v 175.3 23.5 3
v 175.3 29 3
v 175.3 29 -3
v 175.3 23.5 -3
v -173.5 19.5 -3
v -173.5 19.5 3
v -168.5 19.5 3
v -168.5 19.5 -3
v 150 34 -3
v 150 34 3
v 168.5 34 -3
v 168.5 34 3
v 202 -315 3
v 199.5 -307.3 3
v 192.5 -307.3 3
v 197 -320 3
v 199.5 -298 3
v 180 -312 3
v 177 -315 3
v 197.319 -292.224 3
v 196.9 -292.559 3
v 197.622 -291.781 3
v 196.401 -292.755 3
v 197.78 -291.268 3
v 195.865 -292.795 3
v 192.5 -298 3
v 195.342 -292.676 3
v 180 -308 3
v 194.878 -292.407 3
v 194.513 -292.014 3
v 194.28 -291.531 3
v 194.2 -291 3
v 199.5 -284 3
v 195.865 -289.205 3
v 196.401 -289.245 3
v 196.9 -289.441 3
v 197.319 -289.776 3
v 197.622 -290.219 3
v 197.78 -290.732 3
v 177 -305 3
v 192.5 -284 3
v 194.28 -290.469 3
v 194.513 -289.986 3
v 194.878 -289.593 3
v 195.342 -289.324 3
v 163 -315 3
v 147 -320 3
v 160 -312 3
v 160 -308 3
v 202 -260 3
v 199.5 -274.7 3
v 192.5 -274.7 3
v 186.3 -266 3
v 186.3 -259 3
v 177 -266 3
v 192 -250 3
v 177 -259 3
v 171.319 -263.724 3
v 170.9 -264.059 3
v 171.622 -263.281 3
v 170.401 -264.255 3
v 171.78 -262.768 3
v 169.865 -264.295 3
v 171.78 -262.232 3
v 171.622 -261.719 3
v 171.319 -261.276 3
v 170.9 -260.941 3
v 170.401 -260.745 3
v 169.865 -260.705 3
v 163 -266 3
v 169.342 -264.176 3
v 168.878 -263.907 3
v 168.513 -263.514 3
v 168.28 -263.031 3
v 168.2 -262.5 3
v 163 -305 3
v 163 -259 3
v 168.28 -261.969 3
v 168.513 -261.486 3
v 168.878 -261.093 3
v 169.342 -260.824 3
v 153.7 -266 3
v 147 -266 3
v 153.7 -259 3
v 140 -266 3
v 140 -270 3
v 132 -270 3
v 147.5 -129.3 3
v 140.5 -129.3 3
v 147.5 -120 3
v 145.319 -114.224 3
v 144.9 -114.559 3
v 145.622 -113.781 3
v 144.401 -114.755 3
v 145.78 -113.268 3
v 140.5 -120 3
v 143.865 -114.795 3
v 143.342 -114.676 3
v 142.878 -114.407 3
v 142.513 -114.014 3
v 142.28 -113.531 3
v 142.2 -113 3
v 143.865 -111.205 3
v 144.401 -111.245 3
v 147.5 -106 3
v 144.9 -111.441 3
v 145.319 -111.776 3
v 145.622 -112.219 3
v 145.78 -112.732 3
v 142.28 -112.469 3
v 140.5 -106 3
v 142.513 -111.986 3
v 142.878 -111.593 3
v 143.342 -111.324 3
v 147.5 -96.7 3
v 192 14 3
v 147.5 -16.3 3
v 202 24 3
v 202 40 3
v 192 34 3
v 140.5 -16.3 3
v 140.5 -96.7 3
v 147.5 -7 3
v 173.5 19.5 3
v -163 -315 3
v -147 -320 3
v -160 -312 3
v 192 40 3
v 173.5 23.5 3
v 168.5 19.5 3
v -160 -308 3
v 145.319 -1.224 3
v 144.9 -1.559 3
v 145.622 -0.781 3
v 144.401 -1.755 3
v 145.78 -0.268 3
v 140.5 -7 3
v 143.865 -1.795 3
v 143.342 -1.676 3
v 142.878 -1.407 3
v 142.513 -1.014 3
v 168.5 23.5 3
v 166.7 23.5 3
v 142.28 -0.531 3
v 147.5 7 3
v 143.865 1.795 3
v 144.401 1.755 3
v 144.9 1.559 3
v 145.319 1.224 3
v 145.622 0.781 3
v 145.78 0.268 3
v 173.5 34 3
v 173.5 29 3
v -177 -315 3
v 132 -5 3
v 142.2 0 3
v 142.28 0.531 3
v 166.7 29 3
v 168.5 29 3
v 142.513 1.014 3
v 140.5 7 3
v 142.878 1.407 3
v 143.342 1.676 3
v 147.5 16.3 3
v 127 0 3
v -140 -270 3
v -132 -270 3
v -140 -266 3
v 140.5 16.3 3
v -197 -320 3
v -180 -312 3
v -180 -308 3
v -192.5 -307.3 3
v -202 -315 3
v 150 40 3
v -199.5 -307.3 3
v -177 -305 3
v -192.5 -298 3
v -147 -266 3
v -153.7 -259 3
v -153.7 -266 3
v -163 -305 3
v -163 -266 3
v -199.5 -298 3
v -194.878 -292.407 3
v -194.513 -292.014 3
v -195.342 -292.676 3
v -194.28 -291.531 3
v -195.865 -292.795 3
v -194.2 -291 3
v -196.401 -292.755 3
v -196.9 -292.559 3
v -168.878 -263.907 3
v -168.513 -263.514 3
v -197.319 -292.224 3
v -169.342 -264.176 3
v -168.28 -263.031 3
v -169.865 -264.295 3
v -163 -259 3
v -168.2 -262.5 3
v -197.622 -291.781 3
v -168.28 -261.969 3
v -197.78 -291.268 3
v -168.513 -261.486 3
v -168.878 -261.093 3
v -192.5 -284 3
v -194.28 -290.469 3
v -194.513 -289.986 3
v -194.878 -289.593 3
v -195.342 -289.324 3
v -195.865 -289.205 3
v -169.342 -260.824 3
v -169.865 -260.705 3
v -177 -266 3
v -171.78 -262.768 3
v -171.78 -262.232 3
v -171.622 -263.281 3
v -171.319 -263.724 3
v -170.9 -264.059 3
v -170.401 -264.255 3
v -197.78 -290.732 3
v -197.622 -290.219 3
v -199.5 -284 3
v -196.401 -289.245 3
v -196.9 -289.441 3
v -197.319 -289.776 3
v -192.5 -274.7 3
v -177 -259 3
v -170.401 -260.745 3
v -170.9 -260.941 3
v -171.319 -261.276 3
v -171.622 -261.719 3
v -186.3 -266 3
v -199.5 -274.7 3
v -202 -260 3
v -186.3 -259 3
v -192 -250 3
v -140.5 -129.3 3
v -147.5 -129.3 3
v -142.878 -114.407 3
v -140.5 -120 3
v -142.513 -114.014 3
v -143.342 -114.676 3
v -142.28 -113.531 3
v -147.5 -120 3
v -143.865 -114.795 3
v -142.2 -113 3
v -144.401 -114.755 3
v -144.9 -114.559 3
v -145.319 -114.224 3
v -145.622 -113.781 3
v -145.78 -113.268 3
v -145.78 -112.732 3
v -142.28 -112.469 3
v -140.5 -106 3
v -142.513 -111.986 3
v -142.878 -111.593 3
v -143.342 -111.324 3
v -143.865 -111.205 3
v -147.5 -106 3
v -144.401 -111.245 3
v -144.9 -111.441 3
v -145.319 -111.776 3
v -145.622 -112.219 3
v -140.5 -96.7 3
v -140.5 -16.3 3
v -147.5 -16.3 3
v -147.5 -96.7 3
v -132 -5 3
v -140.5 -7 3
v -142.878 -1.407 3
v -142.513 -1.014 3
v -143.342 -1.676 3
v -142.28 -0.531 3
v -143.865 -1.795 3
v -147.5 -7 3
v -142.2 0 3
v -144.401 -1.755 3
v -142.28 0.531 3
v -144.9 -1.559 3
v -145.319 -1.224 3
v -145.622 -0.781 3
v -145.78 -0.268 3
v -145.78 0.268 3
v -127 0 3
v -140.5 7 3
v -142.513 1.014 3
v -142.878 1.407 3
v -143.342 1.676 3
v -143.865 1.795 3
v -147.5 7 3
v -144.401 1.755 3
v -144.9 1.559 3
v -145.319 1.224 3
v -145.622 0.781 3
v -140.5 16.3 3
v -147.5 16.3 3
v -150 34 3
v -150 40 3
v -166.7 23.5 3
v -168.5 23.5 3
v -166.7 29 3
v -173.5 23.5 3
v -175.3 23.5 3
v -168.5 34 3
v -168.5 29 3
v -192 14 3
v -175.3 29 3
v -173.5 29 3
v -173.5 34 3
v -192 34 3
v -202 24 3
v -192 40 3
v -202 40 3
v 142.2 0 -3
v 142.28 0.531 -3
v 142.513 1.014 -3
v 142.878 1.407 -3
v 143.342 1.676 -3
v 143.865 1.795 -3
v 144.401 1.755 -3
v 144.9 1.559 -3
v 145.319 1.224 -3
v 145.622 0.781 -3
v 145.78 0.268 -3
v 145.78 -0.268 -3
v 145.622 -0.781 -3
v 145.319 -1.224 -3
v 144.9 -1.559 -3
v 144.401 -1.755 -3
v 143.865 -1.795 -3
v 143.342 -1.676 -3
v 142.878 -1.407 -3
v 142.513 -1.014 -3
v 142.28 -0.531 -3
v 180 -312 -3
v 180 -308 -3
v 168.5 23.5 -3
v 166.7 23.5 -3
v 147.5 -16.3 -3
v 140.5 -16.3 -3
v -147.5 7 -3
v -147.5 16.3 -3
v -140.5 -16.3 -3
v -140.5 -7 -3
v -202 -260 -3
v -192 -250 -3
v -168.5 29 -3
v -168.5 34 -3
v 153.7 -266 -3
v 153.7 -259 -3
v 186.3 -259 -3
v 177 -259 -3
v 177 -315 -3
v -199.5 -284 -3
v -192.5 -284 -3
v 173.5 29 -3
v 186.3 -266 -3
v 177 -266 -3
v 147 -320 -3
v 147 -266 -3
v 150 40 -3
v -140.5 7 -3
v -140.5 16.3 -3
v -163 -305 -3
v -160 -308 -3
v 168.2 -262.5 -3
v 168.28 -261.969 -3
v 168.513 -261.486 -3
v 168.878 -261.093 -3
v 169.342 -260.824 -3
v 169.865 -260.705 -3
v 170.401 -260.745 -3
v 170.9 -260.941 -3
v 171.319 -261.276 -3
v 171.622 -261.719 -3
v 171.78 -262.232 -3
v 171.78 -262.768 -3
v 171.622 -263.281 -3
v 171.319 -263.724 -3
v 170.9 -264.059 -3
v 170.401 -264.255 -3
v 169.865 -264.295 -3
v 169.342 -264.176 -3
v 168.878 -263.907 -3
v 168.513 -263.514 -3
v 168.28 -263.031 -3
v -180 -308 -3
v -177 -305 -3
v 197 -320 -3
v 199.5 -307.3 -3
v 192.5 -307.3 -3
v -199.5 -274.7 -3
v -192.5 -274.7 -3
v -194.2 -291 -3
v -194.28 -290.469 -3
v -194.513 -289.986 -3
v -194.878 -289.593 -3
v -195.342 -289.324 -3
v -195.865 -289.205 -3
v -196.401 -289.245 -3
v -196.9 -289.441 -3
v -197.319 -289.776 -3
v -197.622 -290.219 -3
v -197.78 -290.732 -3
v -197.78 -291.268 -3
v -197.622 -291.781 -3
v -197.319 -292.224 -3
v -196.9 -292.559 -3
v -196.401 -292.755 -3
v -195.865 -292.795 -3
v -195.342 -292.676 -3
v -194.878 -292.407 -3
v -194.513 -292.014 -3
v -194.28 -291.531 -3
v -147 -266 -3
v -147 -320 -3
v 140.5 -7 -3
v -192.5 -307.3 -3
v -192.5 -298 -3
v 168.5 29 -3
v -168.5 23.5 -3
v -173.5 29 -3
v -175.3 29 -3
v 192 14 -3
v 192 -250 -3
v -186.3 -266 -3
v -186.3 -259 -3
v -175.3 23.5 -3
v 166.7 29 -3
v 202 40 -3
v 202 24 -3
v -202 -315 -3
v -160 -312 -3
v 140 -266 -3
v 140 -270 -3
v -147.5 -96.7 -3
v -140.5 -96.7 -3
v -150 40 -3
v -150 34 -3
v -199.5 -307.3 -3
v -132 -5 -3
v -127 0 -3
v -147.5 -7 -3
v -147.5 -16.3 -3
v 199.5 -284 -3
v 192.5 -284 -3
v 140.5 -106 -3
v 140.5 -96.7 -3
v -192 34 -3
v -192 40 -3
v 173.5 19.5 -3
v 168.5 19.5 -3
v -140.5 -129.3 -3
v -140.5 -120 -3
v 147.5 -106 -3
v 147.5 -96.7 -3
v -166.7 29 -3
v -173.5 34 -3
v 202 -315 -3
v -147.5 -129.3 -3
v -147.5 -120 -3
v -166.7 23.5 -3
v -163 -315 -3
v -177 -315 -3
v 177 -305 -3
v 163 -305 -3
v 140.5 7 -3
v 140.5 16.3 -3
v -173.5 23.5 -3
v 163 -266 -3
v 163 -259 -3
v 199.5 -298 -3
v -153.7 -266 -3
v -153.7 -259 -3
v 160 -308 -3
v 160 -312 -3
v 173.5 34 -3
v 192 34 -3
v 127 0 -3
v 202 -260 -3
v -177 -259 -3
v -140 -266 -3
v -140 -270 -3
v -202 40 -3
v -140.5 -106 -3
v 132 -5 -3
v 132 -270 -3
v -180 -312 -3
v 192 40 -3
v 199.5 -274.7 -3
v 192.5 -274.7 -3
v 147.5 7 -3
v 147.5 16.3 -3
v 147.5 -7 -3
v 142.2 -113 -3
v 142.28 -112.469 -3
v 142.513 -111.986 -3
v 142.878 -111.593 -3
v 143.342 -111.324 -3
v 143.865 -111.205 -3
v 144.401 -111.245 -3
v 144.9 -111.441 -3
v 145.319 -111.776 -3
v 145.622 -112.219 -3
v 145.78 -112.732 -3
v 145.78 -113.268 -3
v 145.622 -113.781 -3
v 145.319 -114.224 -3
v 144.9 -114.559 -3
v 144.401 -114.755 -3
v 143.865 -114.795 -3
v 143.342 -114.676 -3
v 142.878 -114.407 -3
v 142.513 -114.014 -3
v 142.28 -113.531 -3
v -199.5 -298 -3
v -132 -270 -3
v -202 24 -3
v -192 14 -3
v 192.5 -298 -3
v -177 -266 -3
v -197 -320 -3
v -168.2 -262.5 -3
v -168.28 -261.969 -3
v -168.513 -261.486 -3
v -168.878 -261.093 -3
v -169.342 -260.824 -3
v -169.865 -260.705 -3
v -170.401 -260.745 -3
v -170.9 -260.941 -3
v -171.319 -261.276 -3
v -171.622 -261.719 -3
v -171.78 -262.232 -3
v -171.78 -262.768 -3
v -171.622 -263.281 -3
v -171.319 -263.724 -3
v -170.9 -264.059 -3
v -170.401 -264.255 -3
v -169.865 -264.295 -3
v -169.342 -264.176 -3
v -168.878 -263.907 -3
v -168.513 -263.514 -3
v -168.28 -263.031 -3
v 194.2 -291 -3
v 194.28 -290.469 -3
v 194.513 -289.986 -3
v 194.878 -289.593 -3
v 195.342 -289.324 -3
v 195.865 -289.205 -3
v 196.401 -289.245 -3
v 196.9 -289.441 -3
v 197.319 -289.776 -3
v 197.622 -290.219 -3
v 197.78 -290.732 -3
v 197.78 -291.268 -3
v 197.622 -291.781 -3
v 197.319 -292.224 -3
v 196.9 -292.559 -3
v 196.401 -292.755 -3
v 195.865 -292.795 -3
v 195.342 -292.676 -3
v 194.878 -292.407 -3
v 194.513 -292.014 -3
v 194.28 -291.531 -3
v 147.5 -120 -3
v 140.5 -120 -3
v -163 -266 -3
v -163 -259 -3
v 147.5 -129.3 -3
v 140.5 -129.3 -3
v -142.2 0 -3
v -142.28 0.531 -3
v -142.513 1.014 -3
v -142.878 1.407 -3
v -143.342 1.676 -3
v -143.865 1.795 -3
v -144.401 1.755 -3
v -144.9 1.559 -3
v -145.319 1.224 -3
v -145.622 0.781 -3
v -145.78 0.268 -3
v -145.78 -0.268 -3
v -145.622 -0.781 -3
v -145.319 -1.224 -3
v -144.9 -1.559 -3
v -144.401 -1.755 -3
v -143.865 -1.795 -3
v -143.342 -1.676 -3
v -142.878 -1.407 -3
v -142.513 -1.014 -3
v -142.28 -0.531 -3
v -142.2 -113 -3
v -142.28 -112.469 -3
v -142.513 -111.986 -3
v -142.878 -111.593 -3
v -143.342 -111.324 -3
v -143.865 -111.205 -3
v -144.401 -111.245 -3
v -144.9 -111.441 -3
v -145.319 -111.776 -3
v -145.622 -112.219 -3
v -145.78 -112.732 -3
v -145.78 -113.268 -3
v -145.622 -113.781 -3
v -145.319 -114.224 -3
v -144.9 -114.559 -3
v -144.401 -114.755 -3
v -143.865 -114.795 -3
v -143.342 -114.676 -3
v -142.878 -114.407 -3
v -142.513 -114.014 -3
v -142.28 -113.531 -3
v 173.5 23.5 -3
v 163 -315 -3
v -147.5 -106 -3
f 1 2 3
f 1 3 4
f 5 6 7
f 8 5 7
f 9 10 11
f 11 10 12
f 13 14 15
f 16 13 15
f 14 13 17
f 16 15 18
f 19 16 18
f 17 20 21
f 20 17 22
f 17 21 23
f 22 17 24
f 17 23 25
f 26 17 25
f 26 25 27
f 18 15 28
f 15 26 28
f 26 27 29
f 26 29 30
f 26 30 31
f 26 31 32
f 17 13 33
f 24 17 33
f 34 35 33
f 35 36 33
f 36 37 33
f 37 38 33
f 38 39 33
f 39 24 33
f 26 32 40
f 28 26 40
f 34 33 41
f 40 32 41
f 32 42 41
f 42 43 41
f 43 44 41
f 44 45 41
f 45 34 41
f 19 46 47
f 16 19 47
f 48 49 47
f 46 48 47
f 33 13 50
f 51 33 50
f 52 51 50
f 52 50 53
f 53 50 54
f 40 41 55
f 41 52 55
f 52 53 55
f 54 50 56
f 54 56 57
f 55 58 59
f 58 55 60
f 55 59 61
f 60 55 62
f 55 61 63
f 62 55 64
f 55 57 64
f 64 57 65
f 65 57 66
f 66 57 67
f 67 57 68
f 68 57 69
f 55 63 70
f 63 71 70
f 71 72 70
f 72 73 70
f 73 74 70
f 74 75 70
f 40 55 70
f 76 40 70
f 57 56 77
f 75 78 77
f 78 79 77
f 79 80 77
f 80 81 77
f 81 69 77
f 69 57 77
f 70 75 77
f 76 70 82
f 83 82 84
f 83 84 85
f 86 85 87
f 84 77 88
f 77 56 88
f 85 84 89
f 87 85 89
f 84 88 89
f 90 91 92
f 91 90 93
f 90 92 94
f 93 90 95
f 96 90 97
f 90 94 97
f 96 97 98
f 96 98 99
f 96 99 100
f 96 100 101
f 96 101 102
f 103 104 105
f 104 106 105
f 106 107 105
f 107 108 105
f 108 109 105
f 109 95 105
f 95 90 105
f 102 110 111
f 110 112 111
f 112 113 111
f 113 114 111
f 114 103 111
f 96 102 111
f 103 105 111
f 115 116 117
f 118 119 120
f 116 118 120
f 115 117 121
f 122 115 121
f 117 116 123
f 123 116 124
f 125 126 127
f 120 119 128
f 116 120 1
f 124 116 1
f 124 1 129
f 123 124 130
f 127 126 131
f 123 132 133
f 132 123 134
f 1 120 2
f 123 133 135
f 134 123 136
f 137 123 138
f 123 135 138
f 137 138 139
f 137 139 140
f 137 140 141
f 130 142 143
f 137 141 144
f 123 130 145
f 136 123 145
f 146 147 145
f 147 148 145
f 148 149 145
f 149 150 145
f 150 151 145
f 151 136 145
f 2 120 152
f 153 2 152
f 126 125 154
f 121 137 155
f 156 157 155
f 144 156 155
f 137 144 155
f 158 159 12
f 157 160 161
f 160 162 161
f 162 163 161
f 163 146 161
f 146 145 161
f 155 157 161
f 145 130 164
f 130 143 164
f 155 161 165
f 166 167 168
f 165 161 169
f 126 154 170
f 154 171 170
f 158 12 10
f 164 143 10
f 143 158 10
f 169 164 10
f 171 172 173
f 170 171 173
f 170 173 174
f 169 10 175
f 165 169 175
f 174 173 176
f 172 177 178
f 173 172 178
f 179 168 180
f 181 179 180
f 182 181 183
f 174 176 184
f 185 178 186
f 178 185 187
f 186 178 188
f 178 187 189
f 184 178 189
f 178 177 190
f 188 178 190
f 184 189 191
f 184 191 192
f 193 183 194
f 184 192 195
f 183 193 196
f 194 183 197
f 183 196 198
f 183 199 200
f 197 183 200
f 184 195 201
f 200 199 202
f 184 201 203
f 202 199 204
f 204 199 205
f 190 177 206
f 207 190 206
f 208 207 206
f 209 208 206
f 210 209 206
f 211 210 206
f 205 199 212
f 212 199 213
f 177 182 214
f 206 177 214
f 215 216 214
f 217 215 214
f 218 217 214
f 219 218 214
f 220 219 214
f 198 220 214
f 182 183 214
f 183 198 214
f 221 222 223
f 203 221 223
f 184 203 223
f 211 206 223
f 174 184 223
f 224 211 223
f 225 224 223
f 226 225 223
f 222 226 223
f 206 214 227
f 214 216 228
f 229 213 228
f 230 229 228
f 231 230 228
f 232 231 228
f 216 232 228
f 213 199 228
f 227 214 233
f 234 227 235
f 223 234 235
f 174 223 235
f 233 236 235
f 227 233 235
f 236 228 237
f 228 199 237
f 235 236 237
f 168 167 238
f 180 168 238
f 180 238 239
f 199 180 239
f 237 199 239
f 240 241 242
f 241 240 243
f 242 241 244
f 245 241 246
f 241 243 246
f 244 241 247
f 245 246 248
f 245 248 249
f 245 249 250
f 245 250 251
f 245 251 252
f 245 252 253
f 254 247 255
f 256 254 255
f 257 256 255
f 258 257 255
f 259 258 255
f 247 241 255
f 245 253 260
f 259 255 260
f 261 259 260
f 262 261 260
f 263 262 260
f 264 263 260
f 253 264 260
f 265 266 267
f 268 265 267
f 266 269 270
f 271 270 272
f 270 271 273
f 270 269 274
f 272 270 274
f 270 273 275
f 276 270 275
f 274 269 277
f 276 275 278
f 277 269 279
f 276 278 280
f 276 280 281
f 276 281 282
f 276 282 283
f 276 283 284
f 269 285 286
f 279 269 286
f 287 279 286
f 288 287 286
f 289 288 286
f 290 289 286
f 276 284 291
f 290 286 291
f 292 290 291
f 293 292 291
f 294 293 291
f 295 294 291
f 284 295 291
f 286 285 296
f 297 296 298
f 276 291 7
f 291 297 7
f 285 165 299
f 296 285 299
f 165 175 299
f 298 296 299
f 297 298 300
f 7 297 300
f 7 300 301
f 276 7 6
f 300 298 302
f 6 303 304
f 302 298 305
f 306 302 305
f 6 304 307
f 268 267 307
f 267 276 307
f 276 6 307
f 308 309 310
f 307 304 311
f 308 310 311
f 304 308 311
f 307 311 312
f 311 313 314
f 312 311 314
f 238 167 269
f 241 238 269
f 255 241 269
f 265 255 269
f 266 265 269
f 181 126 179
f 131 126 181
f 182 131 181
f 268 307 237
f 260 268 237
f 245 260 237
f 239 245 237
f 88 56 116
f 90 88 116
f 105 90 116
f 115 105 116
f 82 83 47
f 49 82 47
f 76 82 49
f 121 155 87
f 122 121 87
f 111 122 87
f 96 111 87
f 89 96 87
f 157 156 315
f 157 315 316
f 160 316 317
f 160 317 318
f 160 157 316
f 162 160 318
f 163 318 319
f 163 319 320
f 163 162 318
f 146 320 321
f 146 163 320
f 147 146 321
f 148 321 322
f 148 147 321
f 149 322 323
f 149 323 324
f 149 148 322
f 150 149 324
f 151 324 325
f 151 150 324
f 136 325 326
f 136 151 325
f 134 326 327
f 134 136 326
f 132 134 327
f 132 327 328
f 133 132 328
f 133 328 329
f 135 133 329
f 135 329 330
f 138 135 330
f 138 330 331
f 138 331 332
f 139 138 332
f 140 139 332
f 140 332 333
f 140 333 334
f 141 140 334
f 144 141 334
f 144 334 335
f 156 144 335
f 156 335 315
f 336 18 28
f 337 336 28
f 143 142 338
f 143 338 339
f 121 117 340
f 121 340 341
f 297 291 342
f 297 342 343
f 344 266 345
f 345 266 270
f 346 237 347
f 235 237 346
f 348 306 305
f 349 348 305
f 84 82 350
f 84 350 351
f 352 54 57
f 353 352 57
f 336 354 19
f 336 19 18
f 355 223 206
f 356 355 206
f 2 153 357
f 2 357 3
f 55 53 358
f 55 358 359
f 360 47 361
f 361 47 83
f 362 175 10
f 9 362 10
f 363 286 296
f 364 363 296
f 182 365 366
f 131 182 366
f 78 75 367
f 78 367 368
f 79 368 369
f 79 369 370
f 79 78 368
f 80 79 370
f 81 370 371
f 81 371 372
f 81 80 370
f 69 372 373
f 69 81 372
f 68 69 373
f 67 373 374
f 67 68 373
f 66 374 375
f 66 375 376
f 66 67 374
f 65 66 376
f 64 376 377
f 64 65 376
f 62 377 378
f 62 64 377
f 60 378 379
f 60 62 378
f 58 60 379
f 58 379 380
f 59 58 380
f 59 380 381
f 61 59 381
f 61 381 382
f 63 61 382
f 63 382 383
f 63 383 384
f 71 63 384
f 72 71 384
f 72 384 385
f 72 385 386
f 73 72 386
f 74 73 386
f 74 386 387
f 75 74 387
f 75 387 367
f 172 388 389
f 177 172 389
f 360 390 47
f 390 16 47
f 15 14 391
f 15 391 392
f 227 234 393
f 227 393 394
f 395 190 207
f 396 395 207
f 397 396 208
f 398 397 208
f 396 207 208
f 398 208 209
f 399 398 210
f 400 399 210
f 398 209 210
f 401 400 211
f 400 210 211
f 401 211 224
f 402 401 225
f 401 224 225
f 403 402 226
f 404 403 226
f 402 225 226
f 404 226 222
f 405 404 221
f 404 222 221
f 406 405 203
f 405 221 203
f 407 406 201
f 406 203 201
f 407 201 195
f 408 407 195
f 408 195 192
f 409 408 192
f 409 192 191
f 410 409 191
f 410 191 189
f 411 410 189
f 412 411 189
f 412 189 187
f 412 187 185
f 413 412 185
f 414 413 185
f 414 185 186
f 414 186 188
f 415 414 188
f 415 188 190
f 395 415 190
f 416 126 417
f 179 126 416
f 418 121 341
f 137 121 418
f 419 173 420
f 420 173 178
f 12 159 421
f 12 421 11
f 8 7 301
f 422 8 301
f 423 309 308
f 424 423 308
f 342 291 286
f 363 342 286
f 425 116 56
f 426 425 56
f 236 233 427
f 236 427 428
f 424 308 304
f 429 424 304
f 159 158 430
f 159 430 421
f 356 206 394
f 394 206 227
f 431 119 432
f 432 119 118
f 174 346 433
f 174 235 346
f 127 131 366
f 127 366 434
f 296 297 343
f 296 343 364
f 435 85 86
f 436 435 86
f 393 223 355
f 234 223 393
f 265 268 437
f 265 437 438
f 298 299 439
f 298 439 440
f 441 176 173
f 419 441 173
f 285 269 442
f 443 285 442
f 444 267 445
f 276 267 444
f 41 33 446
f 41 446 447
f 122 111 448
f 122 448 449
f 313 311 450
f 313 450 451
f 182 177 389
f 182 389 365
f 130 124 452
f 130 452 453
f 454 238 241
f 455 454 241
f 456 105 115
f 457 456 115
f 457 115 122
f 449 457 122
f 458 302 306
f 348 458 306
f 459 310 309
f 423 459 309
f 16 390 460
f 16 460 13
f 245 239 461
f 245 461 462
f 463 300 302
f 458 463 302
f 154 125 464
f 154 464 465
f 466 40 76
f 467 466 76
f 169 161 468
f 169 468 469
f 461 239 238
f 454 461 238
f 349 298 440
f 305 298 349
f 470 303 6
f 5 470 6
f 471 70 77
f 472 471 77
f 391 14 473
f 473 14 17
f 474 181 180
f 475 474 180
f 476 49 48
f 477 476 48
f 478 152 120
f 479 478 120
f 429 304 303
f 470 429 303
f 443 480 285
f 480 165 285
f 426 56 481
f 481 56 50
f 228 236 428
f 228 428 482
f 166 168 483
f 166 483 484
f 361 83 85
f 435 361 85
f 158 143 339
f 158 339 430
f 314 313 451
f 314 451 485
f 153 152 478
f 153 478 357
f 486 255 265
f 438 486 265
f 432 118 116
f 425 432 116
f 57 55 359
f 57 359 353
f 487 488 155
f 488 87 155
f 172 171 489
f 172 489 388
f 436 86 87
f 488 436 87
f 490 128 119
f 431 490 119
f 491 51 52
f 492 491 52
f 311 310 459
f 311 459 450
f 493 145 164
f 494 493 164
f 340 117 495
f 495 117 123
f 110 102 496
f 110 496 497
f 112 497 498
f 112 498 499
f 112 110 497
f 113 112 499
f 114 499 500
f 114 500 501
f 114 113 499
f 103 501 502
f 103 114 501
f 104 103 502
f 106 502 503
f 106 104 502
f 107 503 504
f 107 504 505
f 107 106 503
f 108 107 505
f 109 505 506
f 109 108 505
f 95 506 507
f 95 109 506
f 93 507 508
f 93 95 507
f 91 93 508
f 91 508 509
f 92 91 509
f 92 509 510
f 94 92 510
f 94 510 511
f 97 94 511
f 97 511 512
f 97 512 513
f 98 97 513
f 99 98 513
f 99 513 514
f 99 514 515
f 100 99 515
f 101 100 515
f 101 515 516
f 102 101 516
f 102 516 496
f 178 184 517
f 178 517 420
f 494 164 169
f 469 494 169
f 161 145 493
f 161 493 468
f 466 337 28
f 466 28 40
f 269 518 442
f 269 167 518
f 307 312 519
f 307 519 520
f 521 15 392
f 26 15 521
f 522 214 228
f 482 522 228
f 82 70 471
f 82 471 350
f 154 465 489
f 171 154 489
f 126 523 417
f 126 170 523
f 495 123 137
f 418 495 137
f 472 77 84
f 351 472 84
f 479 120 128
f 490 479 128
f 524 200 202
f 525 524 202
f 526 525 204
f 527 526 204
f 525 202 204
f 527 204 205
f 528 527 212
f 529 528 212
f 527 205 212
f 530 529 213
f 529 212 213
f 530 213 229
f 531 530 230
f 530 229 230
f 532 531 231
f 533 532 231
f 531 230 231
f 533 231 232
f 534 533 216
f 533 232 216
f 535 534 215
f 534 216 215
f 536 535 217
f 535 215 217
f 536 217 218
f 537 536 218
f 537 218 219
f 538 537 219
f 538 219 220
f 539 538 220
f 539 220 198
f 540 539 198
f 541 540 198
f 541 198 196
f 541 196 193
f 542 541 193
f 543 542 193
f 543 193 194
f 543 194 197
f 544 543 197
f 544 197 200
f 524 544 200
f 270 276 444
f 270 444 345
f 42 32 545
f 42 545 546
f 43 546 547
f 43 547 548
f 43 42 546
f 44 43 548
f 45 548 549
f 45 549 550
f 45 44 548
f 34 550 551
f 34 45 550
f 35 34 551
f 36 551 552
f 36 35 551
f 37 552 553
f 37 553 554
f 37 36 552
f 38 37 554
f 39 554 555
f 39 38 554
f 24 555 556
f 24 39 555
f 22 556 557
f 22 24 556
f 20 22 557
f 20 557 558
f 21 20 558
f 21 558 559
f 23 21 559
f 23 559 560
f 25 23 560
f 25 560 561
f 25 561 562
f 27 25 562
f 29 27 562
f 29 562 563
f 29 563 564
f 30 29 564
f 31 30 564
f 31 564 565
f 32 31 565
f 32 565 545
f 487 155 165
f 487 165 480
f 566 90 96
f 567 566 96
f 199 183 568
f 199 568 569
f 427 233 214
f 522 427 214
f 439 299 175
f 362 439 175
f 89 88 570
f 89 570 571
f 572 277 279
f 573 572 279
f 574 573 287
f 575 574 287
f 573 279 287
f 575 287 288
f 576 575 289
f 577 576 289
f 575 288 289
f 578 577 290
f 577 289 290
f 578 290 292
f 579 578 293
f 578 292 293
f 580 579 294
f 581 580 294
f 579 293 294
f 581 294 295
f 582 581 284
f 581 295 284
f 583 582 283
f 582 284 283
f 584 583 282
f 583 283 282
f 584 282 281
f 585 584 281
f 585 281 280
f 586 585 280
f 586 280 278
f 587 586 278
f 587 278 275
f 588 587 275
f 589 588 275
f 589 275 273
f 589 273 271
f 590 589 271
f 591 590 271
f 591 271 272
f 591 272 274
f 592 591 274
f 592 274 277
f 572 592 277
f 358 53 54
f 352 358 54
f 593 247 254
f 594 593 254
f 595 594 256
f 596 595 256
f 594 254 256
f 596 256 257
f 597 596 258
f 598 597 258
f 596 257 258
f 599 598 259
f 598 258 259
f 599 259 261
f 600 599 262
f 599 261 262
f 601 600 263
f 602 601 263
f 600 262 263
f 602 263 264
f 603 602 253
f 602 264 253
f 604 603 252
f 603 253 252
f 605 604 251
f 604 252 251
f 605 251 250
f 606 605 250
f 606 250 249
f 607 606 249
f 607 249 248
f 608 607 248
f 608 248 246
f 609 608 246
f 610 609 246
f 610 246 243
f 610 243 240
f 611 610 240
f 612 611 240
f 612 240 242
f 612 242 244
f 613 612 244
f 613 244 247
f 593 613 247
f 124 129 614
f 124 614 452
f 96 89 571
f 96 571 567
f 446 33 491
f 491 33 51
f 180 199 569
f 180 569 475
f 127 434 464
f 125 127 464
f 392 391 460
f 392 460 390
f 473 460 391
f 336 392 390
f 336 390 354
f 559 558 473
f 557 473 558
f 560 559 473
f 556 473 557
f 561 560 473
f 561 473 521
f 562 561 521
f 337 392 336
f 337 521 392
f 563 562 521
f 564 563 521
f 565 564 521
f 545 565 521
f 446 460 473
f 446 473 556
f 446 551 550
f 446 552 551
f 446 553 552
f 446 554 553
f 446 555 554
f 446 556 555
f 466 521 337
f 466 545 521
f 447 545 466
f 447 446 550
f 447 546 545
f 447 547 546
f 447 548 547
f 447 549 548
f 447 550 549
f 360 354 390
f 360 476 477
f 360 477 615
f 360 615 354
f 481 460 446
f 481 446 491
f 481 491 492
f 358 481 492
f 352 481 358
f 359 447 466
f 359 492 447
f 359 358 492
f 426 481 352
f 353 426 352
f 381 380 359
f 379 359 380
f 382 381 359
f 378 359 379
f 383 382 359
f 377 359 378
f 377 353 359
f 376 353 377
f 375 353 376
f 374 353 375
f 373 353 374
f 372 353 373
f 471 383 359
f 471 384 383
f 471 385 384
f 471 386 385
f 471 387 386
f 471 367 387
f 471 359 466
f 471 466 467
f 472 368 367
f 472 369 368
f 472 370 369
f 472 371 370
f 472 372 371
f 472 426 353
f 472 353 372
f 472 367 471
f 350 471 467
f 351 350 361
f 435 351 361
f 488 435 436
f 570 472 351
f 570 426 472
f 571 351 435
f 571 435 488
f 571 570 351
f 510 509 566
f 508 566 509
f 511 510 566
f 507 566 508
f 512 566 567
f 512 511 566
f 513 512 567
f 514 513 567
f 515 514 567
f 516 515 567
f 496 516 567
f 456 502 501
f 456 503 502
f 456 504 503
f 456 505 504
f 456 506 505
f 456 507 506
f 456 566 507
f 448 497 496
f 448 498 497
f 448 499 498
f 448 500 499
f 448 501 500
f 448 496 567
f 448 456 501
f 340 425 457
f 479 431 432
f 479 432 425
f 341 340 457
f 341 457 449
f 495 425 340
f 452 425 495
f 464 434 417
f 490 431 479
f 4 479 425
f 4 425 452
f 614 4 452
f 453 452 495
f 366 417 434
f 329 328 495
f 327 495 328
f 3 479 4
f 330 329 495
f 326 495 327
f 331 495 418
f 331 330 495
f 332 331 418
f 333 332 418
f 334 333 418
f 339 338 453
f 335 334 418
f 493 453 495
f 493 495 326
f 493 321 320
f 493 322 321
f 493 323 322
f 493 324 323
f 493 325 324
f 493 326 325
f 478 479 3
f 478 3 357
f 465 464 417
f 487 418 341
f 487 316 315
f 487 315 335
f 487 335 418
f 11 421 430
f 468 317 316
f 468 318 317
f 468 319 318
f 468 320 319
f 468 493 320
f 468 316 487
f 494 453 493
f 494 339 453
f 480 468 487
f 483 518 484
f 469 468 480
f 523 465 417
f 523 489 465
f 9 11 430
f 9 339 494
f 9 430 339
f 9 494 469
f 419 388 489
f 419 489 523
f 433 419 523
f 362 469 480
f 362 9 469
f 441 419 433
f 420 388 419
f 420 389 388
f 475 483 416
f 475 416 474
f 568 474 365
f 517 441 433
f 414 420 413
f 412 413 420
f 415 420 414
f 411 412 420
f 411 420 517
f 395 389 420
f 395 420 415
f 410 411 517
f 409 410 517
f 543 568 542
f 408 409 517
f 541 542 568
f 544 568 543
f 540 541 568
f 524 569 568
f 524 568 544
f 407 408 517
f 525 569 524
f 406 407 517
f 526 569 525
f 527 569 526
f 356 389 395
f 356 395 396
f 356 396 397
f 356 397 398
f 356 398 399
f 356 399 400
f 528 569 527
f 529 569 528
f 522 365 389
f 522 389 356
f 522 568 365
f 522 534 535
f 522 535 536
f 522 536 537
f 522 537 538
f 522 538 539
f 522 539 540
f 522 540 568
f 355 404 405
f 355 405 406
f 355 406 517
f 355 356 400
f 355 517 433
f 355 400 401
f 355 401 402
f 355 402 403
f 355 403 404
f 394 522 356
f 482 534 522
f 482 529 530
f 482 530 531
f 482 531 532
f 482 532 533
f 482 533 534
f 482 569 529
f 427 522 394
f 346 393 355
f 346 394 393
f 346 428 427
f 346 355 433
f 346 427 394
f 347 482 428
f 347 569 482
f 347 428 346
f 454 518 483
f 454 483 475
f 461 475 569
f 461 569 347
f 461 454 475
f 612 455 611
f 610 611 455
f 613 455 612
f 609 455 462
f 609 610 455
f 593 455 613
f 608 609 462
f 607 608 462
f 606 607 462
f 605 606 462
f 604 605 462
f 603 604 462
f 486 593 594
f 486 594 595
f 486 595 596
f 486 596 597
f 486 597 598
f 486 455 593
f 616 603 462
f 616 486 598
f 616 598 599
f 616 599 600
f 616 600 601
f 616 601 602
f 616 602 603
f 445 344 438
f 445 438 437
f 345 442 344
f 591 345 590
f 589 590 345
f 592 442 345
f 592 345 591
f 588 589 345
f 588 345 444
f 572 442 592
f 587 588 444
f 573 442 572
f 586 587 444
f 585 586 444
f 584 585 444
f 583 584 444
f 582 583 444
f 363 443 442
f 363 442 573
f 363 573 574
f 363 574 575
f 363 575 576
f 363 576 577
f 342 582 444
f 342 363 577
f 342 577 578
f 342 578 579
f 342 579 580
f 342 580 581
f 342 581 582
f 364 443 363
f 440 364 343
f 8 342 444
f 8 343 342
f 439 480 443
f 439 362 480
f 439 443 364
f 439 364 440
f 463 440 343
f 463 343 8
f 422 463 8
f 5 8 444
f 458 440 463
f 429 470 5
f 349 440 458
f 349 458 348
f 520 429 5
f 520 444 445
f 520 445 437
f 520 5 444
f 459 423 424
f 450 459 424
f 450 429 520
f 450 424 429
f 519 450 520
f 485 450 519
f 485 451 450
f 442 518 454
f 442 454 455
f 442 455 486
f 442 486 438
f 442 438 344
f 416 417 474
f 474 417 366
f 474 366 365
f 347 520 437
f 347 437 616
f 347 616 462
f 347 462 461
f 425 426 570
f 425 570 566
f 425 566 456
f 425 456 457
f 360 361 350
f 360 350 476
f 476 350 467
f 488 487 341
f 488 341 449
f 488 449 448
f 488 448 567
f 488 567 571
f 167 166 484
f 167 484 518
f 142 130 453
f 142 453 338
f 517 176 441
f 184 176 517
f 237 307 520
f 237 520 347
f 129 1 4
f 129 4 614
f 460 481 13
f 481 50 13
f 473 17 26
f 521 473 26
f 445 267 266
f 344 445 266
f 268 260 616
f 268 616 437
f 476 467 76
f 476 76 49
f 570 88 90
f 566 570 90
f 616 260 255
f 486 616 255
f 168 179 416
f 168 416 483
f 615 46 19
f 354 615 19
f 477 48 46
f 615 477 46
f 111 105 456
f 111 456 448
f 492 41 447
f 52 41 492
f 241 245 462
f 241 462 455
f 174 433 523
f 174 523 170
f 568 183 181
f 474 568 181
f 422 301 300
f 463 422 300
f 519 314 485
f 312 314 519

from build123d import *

# Parameters (mm, degrees)
BOSS_EXTRU_1_DEPTH      = 3
ENL_V_MAT_EXTRU_1_REACH = 8
ESQUISSE2_W             = 7
ESQUISSE2_H             = 9.3
ESQUISSE2_R             = 1.8
ESQUISSE2_W_2           = 9.3
ESQUISSE2_H_2           = 7
CHANFREIN1_SIZE         = 5


with BuildPart() as part:
    # Esquisse1 → Boss.-Extru.1 (new body, symmetric)
    with BuildSketch(Plane.XY):
        Polygon((0, 0), (0, 40), (-150, 40), (-150, 34), (-192, 34), (-192, 40), (-202, 40), (-202, 24), (-192, 14), (-192, -250), (-202, -260), (-202, -320), (-147, -320), (-147, -266), (-140, -266), (-140, -270), (-132, -270), (-132, 0), align=None)
    extrude(amount=BOSS_EXTRU_1_DEPTH, both=True)

    # Esquisse2 → Enlèv. mat.-Extru.1 (cut, up to next)
    with BuildSketch(Plane.XY.offset(3), mode=Mode.PRIVATE) as enl_v_mat_extru_1_sk1:
        with Locations((-144, 11.65)):
            Rectangle(ESQUISSE2_W, ESQUISSE2_H)
    enl_v_mat_extru_1_tool1 = extrude(enl_v_mat_extru_1_sk1.sketch, amount=-ENL_V_MAT_EXTRU_1_REACH, mode=Mode.PRIVATE) & part.part
    add(enl_v_mat_extru_1_tool1.solids().sort_by_distance((-144, 11.65, 3))[0], mode=Mode.SUBTRACT)
    # Esquisse2 → Enlèv. mat.-Extru.1 (cut, up to next)
    with BuildSketch(Plane.XY.offset(3), mode=Mode.PRIVATE) as enl_v_mat_extru_1_sk2:
        with Locations((-144, -11.65)):
            Rectangle(ESQUISSE2_W, ESQUISSE2_H)
    enl_v_mat_extru_1_tool2 = extrude(enl_v_mat_extru_1_sk2.sketch, amount=-ENL_V_MAT_EXTRU_1_REACH, mode=Mode.PRIVATE) & part.part
    add(enl_v_mat_extru_1_tool2.solids().sort_by_distance((-144, -11.65, 3))[0], mode=Mode.SUBTRACT)
    # Esquisse2 → Enlèv. mat.-Extru.1 (cut, up to next)
    with BuildSketch(Plane.XY.offset(3), mode=Mode.PRIVATE) as enl_v_mat_extru_1_sk3:
        with Locations((-144, -101.35)):
            Rectangle(ESQUISSE2_W, ESQUISSE2_H)
    enl_v_mat_extru_1_tool3 = extrude(enl_v_mat_extru_1_sk3.sketch, amount=-ENL_V_MAT_EXTRU_1_REACH, mode=Mode.PRIVATE) & part.part
    add(enl_v_mat_extru_1_tool3.solids().sort_by_distance((-144, -101.35, 3))[0], mode=Mode.SUBTRACT)
    # Esquisse2 → Enlèv. mat.-Extru.1 (cut, up to next)
    with BuildSketch(Plane.XY.offset(3), mode=Mode.PRIVATE) as enl_v_mat_extru_1_sk4:
        with Locations((-144, -113)):
            Circle(ESQUISSE2_R)
    enl_v_mat_extru_1_tool4 = extrude(enl_v_mat_extru_1_sk4.sketch, amount=-ENL_V_MAT_EXTRU_1_REACH, mode=Mode.PRIVATE) & part.part
    add(enl_v_mat_extru_1_tool4.solids().sort_by_distance((-144, -113, 3))[0], mode=Mode.SUBTRACT)
    # Esquisse2 → Enlèv. mat.-Extru.1 (cut, up to next)
    with BuildSketch(Plane.XY.offset(3), mode=Mode.PRIVATE) as enl_v_mat_extru_1_sk5:
        with Locations((-144, 0)):
            Circle(ESQUISSE2_R)
    enl_v_mat_extru_1_tool5 = extrude(enl_v_mat_extru_1_sk5.sketch, amount=-ENL_V_MAT_EXTRU_1_REACH, mode=Mode.PRIVATE) & part.part
    add(enl_v_mat_extru_1_tool5.solids().sort_by_distance((-144, 0, 3))[0], mode=Mode.SUBTRACT)
    # Esquisse2 → Enlèv. mat.-Extru.1 (cut, up to next)
    with BuildSketch(Plane.XY.offset(3), mode=Mode.PRIVATE) as enl_v_mat_extru_1_sk6:
        Polygon((-168.5, 34), (-173.5, 34), (-173.5, 29), (-175.3, 29), (-175.3, 23.5), (-173.5, 23.5), (-173.5, 19.5), (-168.5, 19.5), (-168.5, 23.5), (-166.7, 23.5), (-166.7, 29), (-168.5, 29), align=None)
    enl_v_mat_extru_1_tool6 = extrude(enl_v_mat_extru_1_sk6.sketch, amount=-ENL_V_MAT_EXTRU_1_REACH, mode=Mode.PRIVATE) & part.part
    add(enl_v_mat_extru_1_tool6.solids().sort_by_distance((-171, 26.642741, 3))[0], mode=Mode.SUBTRACT)
    # Esquisse2 → Enlèv. mat.-Extru.1 (cut, up to next)
    with BuildSketch(Plane.XY.offset(3), mode=Mode.PRIVATE) as enl_v_mat_extru_1_sk7:
        with Locations((-144, -124.65)):
            Rectangle(ESQUISSE2_W, ESQUISSE2_H)
    enl_v_mat_extru_1_tool7 = extrude(enl_v_mat_extru_1_sk7.sketch, amount=-ENL_V_MAT_EXTRU_1_REACH, mode=Mode.PRIVATE) & part.part
    add(enl_v_mat_extru_1_tool7.solids().sort_by_distance((-144, -124.65, 3))[0], mode=Mode.SUBTRACT)
    # Esquisse2 → Enlèv. mat.-Extru.1 (cut, up to next)
    with BuildSketch(Plane.XY.offset(3), mode=Mode.PRIVATE) as enl_v_mat_extru_1_sk8:
        with Locations((-158.35, -262.5)):
            Rectangle(ESQUISSE2_W_2, ESQUISSE2_H_2)
    enl_v_mat_extru_1_tool8 = extrude(enl_v_mat_extru_1_sk8.sketch, amount=-ENL_V_MAT_EXTRU_1_REACH, mode=Mode.PRIVATE) & part.part
    add(enl_v_mat_extru_1_tool8.solids().sort_by_distance((-158.35, -262.5, 3))[0], mode=Mode.SUBTRACT)
    # Esquisse2 → Enlèv. mat.-Extru.1 (cut, up to next)
    with BuildSketch(Plane.XY.offset(3), mode=Mode.PRIVATE) as enl_v_mat_extru_1_sk9:
        with Locations((-170, -262.5)):
            Circle(ESQUISSE2_R)
    enl_v_mat_extru_1_tool9 = extrude(enl_v_mat_extru_1_sk9.sketch, amount=-ENL_V_MAT_EXTRU_1_REACH, mode=Mode.PRIVATE) & part.part
    add(enl_v_mat_extru_1_tool9.solids().sort_by_distance((-170, -262.5, 3))[0], mode=Mode.SUBTRACT)
    # Esquisse2 → Enlèv. mat.-Extru.1 (cut, up to next)
    with BuildSketch(Plane.XY.offset(3), mode=Mode.PRIVATE) as enl_v_mat_extru_1_sk10:
        with Locations((-181.65, -262.5)):
            Rectangle(ESQUISSE2_W_2, ESQUISSE2_H_2)
    enl_v_mat_extru_1_tool10 = extrude(enl_v_mat_extru_1_sk10.sketch, amount=-ENL_V_MAT_EXTRU_1_REACH, mode=Mode.PRIVATE) & part.part
    add(enl_v_mat_extru_1_tool10.solids().sort_by_distance((-181.65, -262.5, 3))[0], mode=Mode.SUBTRACT)
    # Esquisse2 → Enlèv. mat.-Extru.1 (cut, up to next)
    with BuildSketch(Plane.XY.offset(3), mode=Mode.PRIVATE) as enl_v_mat_extru_1_sk11:
        with Locations((-196, -279.35)):
            Rectangle(ESQUISSE2_W, ESQUISSE2_H)
    enl_v_mat_extru_1_tool11 = extrude(enl_v_mat_extru_1_sk11.sketch, amount=-ENL_V_MAT_EXTRU_1_REACH, mode=Mode.PRIVATE) & part.part
    add(enl_v_mat_extru_1_tool11.solids().sort_by_distance((-196, -279.35, 3))[0], mode=Mode.SUBTRACT)
    # Esquisse2 → Enlèv. mat.-Extru.1 (cut, up to next)
    with BuildSketch(Plane.XY.offset(3), mode=Mode.PRIVATE) as enl_v_mat_extru_1_sk12:
        with Locations((-196, -291)):
            Circle(ESQUISSE2_R)
    enl_v_mat_extru_1_tool12 = extrude(enl_v_mat_extru_1_sk12.sketch, amount=-ENL_V_MAT_EXTRU_1_REACH, mode=Mode.PRIVATE) & part.part
    add(enl_v_mat_extru_1_tool12.solids().sort_by_distance((-196, -291, 3))[0], mode=Mode.SUBTRACT)
    # Esquisse2 → Enlèv. mat.-Extru.1 (cut, up to next)
    with BuildSketch(Plane.XY.offset(3), mode=Mode.PRIVATE) as enl_v_mat_extru_1_sk13:
        with Locations((-196, -302.65)):
            Rectangle(ESQUISSE2_W, ESQUISSE2_H)
    enl_v_mat_extru_1_tool13 = extrude(enl_v_mat_extru_1_sk13.sketch, amount=-ENL_V_MAT_EXTRU_1_REACH, mode=Mode.PRIVATE) & part.part
    add(enl_v_mat_extru_1_tool13.solids().sort_by_distance((-196, -302.65, 3))[0], mode=Mode.SUBTRACT)
    # Esquisse2 → Enlèv. mat.-Extru.1 (cut, up to next)
    with BuildSketch(Plane.XY.offset(3), mode=Mode.PRIVATE) as enl_v_mat_extru_1_sk14:
        Polygon((-180, -312), (-180, -308), (-177, -305), (-163, -305), (-160, -308), (-160, -312), (-163, -315), (-177, -315), align=None)
    enl_v_mat_extru_1_tool14 = extrude(enl_v_mat_extru_1_sk14.sketch, amount=-ENL_V_MAT_EXTRU_1_REACH, mode=Mode.PRIVATE) & part.part
    add(enl_v_mat_extru_1_tool14.solids().sort_by_distance((-170, -310, 3))[0], mode=Mode.SUBTRACT)

    # Chanfrein1
    chanfrein1_edges = [part.edges().sort_by_distance(p)[0] for p in [
        (-132, 0, 0),
        (-202, -320, 0),
    ]]
    chamfer(chanfrein1_edges, length=CHANFREIN1_SIZE)

    # Symétrie1: part across plane


with BuildPart() as part_1:
    add(part.part)
    add(part.part.mirror(Plane(origin=(0, 0, 3), x_dir=(0, 0, 1), z_dir=(-1, 0, 0))))


solid = part_1.part
